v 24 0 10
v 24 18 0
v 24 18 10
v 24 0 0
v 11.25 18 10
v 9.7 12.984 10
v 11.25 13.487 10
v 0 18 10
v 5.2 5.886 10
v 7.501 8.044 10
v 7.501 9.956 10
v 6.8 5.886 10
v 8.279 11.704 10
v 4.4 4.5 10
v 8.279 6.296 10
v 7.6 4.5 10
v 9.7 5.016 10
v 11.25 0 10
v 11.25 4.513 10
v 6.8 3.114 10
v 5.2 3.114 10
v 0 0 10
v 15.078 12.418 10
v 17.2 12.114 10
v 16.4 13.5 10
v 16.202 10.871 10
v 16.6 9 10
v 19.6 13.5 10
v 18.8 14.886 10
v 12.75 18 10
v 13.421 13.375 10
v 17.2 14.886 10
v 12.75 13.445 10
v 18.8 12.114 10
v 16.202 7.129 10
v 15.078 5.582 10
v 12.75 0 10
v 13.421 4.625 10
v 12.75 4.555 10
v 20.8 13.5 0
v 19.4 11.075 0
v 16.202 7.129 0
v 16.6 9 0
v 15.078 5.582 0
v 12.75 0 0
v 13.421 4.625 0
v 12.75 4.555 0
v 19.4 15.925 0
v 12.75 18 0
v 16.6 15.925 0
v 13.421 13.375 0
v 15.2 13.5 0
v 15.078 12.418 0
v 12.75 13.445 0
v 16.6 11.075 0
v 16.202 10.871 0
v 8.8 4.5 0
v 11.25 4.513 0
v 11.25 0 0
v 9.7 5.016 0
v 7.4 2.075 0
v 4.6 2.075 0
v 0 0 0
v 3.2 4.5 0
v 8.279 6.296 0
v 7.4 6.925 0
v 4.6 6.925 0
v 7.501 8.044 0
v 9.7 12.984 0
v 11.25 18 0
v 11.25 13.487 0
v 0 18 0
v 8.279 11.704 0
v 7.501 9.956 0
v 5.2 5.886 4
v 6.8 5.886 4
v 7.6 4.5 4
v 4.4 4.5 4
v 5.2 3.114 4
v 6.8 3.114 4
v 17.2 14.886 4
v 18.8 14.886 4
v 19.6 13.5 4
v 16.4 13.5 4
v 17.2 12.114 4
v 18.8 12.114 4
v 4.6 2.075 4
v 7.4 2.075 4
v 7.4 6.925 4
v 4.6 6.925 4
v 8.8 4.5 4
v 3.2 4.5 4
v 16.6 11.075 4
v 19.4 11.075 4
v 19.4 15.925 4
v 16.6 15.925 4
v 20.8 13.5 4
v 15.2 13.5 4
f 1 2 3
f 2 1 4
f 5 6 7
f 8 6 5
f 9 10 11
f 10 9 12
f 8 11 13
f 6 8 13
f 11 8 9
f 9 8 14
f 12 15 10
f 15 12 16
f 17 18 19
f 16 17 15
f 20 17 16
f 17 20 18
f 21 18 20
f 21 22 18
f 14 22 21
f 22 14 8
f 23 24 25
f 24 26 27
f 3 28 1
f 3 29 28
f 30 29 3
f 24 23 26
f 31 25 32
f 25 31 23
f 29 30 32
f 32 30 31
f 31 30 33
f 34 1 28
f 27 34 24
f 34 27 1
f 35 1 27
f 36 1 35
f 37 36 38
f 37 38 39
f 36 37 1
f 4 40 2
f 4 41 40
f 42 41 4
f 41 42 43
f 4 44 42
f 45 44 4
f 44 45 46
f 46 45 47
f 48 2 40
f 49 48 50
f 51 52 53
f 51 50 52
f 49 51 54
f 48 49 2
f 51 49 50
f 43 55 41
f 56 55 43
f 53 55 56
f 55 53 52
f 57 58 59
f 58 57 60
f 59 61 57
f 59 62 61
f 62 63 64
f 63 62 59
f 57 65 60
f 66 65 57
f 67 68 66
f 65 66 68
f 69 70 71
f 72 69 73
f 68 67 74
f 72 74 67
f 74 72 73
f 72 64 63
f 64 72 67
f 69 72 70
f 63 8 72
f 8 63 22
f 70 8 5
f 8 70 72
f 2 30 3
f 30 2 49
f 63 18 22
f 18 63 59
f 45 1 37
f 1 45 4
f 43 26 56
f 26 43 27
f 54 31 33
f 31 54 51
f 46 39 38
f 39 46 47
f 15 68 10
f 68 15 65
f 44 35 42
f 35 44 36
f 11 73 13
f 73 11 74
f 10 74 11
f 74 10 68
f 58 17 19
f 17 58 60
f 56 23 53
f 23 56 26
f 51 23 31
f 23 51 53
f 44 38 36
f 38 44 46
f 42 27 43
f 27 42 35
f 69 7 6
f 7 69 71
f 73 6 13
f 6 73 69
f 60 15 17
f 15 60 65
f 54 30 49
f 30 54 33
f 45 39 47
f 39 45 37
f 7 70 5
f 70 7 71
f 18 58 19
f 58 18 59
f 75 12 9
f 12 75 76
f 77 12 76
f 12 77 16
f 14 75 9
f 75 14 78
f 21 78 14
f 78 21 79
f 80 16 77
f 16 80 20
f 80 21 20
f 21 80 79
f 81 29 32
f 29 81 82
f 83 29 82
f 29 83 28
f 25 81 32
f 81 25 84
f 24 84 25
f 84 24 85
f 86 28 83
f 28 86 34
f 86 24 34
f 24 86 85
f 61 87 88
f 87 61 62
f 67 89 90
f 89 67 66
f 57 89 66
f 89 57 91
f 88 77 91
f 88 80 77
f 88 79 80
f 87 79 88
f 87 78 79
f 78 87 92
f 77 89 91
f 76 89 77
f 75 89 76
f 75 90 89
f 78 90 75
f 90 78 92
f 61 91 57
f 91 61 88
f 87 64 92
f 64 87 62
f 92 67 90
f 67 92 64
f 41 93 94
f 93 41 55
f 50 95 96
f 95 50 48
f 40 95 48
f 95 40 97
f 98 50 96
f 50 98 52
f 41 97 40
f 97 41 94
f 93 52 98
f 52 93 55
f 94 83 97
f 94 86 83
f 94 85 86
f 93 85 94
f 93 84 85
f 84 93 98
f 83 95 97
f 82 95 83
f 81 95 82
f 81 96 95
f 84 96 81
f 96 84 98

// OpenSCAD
module rod_holder() {
  rod_clear = 9.2;
  od = 18.0; w = 24.0; t = 10.0; slit = 1.5;
  bolt_d = 3.2; nut_flat = 5.6;
  difference() {
    cube([w, od, t], center=false);
    translate([w/2, od/2, -1]) cylinder(h=t+2, d=rod_clear, center=false);
    translate([w/2 - slit/2, 0, -1]) cube([slit, od, t+2], center=false);
    translate([w*0.25, od*0.25, -1]) cylinder(h=t+2, d=bolt_d, center=false);
    translate([w*0.75, od*0.75, -1]) cylinder(h=t+2, d=bolt_d, center=false);
    translate([w*0.25, od*0.25, 0]) cylinder(h=4, d=nut_flat, $fn=6, center=false);
    translate([w*0.75, od*0.75, 0]) cylinder(h=4, d=nut_flat, $fn=6, center=false);
  }
}
rod_holder();
